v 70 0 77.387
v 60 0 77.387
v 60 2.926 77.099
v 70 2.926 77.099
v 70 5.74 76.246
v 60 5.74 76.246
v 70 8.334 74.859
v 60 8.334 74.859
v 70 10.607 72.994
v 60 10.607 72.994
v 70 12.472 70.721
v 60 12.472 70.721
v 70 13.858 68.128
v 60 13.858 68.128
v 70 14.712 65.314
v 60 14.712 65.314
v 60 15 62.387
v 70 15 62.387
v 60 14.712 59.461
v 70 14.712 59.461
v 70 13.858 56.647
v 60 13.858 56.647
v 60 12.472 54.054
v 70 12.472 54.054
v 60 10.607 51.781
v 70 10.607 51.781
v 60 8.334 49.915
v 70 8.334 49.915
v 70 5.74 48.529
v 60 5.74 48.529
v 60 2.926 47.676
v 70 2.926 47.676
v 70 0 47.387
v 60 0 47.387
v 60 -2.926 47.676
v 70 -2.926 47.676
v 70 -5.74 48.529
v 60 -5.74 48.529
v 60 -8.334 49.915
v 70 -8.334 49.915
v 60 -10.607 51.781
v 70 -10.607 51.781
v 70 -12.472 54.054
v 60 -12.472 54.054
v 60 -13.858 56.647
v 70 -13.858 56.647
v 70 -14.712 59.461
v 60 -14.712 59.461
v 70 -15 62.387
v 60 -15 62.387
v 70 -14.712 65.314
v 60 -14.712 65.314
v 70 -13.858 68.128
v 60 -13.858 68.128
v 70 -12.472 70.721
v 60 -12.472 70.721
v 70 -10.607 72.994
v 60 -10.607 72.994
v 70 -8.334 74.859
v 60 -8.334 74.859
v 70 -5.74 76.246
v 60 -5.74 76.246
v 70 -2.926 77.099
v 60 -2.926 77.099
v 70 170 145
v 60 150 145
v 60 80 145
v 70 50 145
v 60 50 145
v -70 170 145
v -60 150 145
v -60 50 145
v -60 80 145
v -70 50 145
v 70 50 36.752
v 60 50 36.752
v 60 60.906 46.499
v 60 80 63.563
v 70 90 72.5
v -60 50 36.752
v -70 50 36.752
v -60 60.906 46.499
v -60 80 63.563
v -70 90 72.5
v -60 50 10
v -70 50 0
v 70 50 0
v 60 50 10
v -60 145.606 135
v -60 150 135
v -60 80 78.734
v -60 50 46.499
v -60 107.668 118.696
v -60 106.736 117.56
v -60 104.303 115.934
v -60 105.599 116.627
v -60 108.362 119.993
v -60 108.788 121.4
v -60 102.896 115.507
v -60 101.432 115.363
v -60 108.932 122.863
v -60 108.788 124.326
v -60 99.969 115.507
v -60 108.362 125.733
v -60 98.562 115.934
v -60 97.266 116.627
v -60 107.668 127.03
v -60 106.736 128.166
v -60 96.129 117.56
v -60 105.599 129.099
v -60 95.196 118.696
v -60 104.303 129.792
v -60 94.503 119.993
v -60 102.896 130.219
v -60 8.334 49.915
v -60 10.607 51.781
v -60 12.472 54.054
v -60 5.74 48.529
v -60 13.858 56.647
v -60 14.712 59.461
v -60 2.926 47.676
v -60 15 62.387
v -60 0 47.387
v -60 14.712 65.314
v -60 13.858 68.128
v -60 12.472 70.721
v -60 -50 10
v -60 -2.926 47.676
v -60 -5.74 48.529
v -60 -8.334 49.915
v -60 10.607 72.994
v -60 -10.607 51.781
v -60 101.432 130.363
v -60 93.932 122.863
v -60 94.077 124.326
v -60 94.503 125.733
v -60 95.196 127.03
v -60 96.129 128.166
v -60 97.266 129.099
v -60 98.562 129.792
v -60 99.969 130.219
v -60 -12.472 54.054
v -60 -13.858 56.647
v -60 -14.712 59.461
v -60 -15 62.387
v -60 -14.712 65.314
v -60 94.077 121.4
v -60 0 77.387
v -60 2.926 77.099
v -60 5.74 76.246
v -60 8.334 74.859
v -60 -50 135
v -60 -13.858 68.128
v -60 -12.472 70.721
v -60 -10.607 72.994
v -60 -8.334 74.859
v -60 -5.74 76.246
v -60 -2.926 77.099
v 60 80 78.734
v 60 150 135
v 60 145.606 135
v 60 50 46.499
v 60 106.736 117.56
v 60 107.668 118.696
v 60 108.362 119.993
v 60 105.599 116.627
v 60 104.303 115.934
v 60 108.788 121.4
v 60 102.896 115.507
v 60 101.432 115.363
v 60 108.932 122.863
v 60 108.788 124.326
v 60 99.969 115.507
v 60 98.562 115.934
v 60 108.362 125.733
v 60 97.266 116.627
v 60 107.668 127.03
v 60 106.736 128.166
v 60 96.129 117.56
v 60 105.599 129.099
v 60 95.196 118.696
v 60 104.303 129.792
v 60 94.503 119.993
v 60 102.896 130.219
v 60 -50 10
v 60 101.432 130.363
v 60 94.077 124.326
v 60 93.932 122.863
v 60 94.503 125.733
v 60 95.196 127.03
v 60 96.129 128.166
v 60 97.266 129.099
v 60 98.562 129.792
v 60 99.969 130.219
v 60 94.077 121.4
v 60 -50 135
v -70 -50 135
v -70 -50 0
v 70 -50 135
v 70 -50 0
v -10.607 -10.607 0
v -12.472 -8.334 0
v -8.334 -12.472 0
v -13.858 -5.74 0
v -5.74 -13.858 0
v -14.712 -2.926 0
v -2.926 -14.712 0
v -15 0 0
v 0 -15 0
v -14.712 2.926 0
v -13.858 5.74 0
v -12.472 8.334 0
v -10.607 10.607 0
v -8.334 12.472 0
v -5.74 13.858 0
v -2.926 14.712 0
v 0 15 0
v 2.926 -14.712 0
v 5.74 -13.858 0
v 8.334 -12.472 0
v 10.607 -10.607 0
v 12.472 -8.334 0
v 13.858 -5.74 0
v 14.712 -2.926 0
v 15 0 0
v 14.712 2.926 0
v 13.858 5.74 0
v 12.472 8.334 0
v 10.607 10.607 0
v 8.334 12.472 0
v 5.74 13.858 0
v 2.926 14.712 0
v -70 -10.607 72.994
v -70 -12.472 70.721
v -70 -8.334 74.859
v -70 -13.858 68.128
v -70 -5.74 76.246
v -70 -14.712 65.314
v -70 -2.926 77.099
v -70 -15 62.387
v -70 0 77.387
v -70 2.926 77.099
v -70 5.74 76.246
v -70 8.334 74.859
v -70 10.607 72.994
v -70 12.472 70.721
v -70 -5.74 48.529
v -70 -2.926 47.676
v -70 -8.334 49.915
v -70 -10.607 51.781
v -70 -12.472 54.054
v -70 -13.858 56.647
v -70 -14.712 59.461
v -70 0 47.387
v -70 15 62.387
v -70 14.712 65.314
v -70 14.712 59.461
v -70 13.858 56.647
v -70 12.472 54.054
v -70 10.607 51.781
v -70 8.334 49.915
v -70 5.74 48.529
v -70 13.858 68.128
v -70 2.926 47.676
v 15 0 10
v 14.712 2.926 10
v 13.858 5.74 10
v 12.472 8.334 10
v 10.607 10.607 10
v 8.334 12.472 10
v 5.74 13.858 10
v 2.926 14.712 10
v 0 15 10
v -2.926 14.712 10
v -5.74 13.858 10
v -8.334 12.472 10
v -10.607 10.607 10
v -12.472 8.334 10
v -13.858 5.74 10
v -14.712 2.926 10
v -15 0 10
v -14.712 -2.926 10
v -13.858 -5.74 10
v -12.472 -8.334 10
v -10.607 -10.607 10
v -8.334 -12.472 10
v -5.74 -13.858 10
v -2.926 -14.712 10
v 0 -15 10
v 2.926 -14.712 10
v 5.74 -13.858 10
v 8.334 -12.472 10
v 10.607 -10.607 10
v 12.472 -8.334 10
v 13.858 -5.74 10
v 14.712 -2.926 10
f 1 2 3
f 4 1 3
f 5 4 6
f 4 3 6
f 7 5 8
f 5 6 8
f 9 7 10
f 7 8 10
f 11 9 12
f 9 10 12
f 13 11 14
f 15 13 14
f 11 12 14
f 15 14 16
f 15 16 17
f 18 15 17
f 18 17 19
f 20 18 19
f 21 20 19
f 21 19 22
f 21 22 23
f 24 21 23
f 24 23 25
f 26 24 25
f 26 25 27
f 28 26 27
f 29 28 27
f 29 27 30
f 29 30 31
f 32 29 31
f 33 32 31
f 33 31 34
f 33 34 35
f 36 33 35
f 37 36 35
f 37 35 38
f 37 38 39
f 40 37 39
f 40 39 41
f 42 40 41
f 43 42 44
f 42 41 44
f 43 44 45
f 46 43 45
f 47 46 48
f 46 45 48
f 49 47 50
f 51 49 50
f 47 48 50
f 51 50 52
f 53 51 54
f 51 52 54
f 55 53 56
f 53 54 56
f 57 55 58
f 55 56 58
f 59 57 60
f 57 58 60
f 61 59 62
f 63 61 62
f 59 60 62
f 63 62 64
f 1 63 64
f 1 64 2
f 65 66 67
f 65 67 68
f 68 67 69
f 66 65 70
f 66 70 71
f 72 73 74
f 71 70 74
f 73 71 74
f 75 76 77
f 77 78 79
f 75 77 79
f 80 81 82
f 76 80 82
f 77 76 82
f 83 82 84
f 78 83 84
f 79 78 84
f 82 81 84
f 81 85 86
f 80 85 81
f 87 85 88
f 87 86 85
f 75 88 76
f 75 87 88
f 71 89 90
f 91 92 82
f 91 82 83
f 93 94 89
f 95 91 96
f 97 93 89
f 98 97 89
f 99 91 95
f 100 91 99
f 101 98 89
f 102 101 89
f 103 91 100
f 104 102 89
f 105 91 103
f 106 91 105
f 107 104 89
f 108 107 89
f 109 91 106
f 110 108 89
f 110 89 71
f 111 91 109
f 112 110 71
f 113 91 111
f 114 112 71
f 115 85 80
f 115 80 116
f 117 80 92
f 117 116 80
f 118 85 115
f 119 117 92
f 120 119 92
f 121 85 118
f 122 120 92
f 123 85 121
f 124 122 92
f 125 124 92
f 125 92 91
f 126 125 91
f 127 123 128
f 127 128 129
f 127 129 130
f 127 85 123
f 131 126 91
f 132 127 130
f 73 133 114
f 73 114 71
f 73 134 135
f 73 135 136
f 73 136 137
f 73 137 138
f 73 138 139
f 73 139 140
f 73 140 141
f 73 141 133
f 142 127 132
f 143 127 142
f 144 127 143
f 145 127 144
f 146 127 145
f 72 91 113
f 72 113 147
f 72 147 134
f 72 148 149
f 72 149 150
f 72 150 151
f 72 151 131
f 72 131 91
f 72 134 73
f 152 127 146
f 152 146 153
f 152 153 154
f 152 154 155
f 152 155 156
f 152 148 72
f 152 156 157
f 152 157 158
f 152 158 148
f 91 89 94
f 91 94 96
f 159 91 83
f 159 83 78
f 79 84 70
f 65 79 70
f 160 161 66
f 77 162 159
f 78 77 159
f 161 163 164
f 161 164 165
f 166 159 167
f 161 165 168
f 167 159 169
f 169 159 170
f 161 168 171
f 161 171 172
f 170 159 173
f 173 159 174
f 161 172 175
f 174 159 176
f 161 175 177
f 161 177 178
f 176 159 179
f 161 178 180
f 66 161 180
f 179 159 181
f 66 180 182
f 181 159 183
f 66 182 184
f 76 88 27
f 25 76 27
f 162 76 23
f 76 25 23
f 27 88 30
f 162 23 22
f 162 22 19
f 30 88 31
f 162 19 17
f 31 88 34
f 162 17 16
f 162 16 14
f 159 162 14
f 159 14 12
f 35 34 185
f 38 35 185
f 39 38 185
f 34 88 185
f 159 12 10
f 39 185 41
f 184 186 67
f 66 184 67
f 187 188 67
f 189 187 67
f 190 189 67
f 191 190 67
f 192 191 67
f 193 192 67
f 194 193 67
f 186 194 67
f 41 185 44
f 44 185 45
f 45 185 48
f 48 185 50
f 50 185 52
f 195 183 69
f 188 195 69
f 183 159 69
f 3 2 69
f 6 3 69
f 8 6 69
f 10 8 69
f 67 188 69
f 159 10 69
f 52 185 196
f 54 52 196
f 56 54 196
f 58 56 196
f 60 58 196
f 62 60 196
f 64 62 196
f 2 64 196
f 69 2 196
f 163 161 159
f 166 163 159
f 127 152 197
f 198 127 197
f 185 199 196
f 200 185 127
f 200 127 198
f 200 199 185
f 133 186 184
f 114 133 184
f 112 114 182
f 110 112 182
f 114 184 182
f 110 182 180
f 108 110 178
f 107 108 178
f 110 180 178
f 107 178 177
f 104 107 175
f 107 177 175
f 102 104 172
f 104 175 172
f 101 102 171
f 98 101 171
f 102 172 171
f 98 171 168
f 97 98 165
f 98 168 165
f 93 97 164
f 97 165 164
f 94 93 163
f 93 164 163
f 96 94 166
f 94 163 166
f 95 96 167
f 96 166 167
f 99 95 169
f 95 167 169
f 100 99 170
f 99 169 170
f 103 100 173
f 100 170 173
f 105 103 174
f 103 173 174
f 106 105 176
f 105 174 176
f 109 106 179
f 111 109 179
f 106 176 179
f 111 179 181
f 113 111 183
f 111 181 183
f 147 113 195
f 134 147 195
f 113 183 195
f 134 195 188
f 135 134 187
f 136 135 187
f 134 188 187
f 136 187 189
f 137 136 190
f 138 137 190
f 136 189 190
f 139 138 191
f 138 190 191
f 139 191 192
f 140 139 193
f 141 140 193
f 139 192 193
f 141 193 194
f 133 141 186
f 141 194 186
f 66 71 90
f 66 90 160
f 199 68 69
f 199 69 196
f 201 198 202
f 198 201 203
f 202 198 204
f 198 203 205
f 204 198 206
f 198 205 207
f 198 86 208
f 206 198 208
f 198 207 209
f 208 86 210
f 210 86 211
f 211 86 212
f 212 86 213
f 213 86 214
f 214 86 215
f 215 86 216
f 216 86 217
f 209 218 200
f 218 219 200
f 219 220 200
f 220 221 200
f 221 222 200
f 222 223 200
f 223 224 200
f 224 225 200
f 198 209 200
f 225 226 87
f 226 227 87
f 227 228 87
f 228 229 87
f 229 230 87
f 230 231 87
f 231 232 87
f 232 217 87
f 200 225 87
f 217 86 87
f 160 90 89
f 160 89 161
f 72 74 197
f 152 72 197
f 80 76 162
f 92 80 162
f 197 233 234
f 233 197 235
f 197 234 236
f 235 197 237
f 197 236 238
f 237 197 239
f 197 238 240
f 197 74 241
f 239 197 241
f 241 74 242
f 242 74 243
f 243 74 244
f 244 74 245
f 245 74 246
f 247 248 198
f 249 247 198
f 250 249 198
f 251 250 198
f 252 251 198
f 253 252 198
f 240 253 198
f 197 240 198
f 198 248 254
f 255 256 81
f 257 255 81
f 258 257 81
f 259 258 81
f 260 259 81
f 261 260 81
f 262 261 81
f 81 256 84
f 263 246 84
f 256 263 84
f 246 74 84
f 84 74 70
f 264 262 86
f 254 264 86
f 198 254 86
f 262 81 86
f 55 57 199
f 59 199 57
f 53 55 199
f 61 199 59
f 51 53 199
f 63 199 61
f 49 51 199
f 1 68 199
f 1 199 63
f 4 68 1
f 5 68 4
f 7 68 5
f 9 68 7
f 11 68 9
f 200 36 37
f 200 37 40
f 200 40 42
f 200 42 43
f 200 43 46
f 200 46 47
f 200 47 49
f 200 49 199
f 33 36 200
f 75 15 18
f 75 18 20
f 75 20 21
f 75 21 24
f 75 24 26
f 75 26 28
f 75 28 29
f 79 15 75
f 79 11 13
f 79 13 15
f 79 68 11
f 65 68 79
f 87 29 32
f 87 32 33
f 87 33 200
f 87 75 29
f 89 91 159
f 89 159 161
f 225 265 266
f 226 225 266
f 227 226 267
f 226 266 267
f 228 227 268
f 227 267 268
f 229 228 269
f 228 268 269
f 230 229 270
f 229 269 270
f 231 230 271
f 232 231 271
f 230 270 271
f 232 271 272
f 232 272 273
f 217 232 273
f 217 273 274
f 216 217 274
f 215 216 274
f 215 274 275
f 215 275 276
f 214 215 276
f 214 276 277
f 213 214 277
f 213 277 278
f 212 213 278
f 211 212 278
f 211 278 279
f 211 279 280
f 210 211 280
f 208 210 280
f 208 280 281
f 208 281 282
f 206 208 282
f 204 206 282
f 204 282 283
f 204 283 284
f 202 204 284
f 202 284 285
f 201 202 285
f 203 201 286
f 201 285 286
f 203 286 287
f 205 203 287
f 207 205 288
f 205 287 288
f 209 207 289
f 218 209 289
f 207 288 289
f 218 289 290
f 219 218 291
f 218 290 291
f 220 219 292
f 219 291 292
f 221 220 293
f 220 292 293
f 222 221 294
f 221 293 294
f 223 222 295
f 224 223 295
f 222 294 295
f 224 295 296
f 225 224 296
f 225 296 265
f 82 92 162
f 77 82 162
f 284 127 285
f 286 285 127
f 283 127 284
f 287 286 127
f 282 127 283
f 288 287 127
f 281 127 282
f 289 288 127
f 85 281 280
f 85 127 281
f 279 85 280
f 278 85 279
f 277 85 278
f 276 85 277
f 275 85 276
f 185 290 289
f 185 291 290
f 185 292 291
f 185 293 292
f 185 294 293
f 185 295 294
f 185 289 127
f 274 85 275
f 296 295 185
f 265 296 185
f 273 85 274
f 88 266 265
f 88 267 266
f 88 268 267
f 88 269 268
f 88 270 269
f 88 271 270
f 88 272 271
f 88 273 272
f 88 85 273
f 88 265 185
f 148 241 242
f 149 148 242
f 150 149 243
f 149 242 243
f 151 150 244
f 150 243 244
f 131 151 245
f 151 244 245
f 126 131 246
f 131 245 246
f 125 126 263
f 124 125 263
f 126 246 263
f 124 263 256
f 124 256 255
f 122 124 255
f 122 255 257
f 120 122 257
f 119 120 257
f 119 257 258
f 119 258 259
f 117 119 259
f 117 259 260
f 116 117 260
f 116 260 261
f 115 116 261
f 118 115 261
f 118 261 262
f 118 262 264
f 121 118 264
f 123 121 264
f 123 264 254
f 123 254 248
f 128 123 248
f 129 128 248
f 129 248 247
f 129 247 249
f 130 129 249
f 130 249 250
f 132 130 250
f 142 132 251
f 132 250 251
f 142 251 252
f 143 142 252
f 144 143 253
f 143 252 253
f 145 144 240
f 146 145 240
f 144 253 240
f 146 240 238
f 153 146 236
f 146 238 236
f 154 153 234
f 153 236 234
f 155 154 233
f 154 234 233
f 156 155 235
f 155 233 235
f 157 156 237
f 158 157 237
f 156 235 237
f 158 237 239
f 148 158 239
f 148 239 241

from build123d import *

# Parameters (mm, degrees)
SKETCH1_W            = 140
SKETCH1_H            = 100
BOSS_EXTRUDE1_DEPTH  = 10
SKETCH2_W            = 10
SKETCH2_H            = 100
BOSS_EXTRUDE2_DEPTH  = 120
BOSS_EXTRUDE3_DEPTH  = 10
BOSS_EXTRUDE4_DEPTH  = 10
BOSS_EXTRUDE6_DEPTH  = 140
SKETCH7_W            = 120
SKETCH7_H            = 98.500973615
CUT_EXTRUDE1_DEPTH   = 30
SKETCH8_R            = 15
CUT_EXTRUDE2_DEPTH   = 170
SKETCH9_R            = 15
CUT_EXTRUDE3_DEPTH   = 170
CUT_EXTRUDE4_DEPTH   = 140
SKETCH14_W           = 120
SKETCH14_H           = 70
CUT_EXTRUDE5_DEPTH   = 10
BOSS_EXTRUDE8_DEPTH  = 10
BOSS_EXTRUDE9_DEPTH  = 10
SKETCH17_R           = 7.5
BOSS_EXTRUDE10_DEPTH = 120


with BuildPart() as part:
    # Sketch1 → Boss-Extrude1 (new body)
    with BuildSketch(Plane.XY):
        Rectangle(SKETCH1_W, SKETCH1_H)
    extrude(amount=BOSS_EXTRUDE1_DEPTH)

    # Sketch2 → Boss-Extrude2 (add)
    with BuildSketch(Plane.XY.offset(10)):
        with Locations((65, 0)):
            Rectangle(SKETCH2_W, SKETCH2_H)
        with Locations((-65, 0)):
            Rectangle(SKETCH2_W, SKETCH2_H)
    extrude(amount=BOSS_EXTRUDE2_DEPTH)

    # Sketch3 → Boss-Extrude3 (add)
    with BuildSketch(Plane.ZY.offset(70)):
        Polygon((130, 50), (145, 50), (135, -50), (130, -50), align=None)
    extrude(amount=-BOSS_EXTRUDE3_DEPTH)

    # Sketch4 → Boss-Extrude4 (add)
    with BuildSketch(Plane(origin=(70, 0, 0), x_dir=(0, 0, -1), z_dir=(1, 0, 0))):
        Polygon((-130, 50), (-145, 50), (-135, -50), (-130, -50), align=None)
    extrude(amount=-BOSS_EXTRUDE4_DEPTH)

    # Sketch6 → Boss-Extrude6 (add)
    with BuildSketch(Plane.ZY.offset(70)):
        Polygon((72.5, 90), (145, 170), (145, 50), (72.5, 50), (36.751913988, 50), align=None)
    extrude(amount=-BOSS_EXTRUDE6_DEPTH)

    # Sketch7 → Cut-Extrude1 (cut)
    with BuildSketch(Plane.XZ.offset(-50)):
        with Locations((0, 95.749513193)):
            Rectangle(SKETCH7_W, SKETCH7_H)
    extrude(amount=-CUT_EXTRUDE1_DEPTH, mode=Mode.SUBTRACT)

    # Sketch8 → Cut-Extrude2 (cut)
    with BuildSketch(Plane.ZY.offset(70)):
        with Locations((62.387439839, 0)):
            Circle(SKETCH8_R)
    extrude(amount=-CUT_EXTRUDE2_DEPTH, mode=Mode.SUBTRACT)

    # Sketch9 → Cut-Extrude3 (cut)
    with BuildSketch(Plane.XY.offset(10)):
        Circle(SKETCH9_R)
    extrude(amount=-CUT_EXTRUDE3_DEPTH, mode=Mode.SUBTRACT)

    # Sketch13 → Cut-Extrude4 (cut)
    with BuildSketch(Plane.ZY.offset(70)):
        Polygon((70.157530745, 70), (136.03947853, 146.817766748), (136.03947853, 70), align=None)
    extrude(amount=-CUT_EXTRUDE4_DEPTH, mode=Mode.SUBTRACT)

    # Sketch14 → Cut-Extrude5 (cut)
    with BuildSketch(Plane.XY.offset(145)):
        with Locations((0, 115)):
            Rectangle(SKETCH14_W, SKETCH14_H)
    extrude(amount=-CUT_EXTRUDE5_DEPTH, mode=Mode.SUBTRACT)

    # Sketch15 → Boss-Extrude8 (add)
    with BuildSketch(Plane.ZY.offset(70)):
        Polygon((136.03947853, 146.817766748), (136.03947853, 70), (70.157530745, 70), align=None)
    extrude(amount=-BOSS_EXTRUDE8_DEPTH)

    # Sketch16 → Boss-Extrude9 (add)
    with BuildSketch(Plane(origin=(70, 0, 0), x_dir=(0, 0, -1), z_dir=(1, 0, 0))):
        Polygon((-136.03947853, 146.817766748), (-136.03947853, 70), (-70.157530745, 70), align=None)
    extrude(amount=-BOSS_EXTRUDE9_DEPTH)

    # Sketch17 → Boss-Extrude10 (add)
    with BuildSketch(Plane.ZY.offset(-60)):
        with Locations((122.863088973, 101.43242494)):
            Circle(SKETCH17_R)
    extrude(amount=BOSS_EXTRUDE10_DEPTH)


solid = part.part
